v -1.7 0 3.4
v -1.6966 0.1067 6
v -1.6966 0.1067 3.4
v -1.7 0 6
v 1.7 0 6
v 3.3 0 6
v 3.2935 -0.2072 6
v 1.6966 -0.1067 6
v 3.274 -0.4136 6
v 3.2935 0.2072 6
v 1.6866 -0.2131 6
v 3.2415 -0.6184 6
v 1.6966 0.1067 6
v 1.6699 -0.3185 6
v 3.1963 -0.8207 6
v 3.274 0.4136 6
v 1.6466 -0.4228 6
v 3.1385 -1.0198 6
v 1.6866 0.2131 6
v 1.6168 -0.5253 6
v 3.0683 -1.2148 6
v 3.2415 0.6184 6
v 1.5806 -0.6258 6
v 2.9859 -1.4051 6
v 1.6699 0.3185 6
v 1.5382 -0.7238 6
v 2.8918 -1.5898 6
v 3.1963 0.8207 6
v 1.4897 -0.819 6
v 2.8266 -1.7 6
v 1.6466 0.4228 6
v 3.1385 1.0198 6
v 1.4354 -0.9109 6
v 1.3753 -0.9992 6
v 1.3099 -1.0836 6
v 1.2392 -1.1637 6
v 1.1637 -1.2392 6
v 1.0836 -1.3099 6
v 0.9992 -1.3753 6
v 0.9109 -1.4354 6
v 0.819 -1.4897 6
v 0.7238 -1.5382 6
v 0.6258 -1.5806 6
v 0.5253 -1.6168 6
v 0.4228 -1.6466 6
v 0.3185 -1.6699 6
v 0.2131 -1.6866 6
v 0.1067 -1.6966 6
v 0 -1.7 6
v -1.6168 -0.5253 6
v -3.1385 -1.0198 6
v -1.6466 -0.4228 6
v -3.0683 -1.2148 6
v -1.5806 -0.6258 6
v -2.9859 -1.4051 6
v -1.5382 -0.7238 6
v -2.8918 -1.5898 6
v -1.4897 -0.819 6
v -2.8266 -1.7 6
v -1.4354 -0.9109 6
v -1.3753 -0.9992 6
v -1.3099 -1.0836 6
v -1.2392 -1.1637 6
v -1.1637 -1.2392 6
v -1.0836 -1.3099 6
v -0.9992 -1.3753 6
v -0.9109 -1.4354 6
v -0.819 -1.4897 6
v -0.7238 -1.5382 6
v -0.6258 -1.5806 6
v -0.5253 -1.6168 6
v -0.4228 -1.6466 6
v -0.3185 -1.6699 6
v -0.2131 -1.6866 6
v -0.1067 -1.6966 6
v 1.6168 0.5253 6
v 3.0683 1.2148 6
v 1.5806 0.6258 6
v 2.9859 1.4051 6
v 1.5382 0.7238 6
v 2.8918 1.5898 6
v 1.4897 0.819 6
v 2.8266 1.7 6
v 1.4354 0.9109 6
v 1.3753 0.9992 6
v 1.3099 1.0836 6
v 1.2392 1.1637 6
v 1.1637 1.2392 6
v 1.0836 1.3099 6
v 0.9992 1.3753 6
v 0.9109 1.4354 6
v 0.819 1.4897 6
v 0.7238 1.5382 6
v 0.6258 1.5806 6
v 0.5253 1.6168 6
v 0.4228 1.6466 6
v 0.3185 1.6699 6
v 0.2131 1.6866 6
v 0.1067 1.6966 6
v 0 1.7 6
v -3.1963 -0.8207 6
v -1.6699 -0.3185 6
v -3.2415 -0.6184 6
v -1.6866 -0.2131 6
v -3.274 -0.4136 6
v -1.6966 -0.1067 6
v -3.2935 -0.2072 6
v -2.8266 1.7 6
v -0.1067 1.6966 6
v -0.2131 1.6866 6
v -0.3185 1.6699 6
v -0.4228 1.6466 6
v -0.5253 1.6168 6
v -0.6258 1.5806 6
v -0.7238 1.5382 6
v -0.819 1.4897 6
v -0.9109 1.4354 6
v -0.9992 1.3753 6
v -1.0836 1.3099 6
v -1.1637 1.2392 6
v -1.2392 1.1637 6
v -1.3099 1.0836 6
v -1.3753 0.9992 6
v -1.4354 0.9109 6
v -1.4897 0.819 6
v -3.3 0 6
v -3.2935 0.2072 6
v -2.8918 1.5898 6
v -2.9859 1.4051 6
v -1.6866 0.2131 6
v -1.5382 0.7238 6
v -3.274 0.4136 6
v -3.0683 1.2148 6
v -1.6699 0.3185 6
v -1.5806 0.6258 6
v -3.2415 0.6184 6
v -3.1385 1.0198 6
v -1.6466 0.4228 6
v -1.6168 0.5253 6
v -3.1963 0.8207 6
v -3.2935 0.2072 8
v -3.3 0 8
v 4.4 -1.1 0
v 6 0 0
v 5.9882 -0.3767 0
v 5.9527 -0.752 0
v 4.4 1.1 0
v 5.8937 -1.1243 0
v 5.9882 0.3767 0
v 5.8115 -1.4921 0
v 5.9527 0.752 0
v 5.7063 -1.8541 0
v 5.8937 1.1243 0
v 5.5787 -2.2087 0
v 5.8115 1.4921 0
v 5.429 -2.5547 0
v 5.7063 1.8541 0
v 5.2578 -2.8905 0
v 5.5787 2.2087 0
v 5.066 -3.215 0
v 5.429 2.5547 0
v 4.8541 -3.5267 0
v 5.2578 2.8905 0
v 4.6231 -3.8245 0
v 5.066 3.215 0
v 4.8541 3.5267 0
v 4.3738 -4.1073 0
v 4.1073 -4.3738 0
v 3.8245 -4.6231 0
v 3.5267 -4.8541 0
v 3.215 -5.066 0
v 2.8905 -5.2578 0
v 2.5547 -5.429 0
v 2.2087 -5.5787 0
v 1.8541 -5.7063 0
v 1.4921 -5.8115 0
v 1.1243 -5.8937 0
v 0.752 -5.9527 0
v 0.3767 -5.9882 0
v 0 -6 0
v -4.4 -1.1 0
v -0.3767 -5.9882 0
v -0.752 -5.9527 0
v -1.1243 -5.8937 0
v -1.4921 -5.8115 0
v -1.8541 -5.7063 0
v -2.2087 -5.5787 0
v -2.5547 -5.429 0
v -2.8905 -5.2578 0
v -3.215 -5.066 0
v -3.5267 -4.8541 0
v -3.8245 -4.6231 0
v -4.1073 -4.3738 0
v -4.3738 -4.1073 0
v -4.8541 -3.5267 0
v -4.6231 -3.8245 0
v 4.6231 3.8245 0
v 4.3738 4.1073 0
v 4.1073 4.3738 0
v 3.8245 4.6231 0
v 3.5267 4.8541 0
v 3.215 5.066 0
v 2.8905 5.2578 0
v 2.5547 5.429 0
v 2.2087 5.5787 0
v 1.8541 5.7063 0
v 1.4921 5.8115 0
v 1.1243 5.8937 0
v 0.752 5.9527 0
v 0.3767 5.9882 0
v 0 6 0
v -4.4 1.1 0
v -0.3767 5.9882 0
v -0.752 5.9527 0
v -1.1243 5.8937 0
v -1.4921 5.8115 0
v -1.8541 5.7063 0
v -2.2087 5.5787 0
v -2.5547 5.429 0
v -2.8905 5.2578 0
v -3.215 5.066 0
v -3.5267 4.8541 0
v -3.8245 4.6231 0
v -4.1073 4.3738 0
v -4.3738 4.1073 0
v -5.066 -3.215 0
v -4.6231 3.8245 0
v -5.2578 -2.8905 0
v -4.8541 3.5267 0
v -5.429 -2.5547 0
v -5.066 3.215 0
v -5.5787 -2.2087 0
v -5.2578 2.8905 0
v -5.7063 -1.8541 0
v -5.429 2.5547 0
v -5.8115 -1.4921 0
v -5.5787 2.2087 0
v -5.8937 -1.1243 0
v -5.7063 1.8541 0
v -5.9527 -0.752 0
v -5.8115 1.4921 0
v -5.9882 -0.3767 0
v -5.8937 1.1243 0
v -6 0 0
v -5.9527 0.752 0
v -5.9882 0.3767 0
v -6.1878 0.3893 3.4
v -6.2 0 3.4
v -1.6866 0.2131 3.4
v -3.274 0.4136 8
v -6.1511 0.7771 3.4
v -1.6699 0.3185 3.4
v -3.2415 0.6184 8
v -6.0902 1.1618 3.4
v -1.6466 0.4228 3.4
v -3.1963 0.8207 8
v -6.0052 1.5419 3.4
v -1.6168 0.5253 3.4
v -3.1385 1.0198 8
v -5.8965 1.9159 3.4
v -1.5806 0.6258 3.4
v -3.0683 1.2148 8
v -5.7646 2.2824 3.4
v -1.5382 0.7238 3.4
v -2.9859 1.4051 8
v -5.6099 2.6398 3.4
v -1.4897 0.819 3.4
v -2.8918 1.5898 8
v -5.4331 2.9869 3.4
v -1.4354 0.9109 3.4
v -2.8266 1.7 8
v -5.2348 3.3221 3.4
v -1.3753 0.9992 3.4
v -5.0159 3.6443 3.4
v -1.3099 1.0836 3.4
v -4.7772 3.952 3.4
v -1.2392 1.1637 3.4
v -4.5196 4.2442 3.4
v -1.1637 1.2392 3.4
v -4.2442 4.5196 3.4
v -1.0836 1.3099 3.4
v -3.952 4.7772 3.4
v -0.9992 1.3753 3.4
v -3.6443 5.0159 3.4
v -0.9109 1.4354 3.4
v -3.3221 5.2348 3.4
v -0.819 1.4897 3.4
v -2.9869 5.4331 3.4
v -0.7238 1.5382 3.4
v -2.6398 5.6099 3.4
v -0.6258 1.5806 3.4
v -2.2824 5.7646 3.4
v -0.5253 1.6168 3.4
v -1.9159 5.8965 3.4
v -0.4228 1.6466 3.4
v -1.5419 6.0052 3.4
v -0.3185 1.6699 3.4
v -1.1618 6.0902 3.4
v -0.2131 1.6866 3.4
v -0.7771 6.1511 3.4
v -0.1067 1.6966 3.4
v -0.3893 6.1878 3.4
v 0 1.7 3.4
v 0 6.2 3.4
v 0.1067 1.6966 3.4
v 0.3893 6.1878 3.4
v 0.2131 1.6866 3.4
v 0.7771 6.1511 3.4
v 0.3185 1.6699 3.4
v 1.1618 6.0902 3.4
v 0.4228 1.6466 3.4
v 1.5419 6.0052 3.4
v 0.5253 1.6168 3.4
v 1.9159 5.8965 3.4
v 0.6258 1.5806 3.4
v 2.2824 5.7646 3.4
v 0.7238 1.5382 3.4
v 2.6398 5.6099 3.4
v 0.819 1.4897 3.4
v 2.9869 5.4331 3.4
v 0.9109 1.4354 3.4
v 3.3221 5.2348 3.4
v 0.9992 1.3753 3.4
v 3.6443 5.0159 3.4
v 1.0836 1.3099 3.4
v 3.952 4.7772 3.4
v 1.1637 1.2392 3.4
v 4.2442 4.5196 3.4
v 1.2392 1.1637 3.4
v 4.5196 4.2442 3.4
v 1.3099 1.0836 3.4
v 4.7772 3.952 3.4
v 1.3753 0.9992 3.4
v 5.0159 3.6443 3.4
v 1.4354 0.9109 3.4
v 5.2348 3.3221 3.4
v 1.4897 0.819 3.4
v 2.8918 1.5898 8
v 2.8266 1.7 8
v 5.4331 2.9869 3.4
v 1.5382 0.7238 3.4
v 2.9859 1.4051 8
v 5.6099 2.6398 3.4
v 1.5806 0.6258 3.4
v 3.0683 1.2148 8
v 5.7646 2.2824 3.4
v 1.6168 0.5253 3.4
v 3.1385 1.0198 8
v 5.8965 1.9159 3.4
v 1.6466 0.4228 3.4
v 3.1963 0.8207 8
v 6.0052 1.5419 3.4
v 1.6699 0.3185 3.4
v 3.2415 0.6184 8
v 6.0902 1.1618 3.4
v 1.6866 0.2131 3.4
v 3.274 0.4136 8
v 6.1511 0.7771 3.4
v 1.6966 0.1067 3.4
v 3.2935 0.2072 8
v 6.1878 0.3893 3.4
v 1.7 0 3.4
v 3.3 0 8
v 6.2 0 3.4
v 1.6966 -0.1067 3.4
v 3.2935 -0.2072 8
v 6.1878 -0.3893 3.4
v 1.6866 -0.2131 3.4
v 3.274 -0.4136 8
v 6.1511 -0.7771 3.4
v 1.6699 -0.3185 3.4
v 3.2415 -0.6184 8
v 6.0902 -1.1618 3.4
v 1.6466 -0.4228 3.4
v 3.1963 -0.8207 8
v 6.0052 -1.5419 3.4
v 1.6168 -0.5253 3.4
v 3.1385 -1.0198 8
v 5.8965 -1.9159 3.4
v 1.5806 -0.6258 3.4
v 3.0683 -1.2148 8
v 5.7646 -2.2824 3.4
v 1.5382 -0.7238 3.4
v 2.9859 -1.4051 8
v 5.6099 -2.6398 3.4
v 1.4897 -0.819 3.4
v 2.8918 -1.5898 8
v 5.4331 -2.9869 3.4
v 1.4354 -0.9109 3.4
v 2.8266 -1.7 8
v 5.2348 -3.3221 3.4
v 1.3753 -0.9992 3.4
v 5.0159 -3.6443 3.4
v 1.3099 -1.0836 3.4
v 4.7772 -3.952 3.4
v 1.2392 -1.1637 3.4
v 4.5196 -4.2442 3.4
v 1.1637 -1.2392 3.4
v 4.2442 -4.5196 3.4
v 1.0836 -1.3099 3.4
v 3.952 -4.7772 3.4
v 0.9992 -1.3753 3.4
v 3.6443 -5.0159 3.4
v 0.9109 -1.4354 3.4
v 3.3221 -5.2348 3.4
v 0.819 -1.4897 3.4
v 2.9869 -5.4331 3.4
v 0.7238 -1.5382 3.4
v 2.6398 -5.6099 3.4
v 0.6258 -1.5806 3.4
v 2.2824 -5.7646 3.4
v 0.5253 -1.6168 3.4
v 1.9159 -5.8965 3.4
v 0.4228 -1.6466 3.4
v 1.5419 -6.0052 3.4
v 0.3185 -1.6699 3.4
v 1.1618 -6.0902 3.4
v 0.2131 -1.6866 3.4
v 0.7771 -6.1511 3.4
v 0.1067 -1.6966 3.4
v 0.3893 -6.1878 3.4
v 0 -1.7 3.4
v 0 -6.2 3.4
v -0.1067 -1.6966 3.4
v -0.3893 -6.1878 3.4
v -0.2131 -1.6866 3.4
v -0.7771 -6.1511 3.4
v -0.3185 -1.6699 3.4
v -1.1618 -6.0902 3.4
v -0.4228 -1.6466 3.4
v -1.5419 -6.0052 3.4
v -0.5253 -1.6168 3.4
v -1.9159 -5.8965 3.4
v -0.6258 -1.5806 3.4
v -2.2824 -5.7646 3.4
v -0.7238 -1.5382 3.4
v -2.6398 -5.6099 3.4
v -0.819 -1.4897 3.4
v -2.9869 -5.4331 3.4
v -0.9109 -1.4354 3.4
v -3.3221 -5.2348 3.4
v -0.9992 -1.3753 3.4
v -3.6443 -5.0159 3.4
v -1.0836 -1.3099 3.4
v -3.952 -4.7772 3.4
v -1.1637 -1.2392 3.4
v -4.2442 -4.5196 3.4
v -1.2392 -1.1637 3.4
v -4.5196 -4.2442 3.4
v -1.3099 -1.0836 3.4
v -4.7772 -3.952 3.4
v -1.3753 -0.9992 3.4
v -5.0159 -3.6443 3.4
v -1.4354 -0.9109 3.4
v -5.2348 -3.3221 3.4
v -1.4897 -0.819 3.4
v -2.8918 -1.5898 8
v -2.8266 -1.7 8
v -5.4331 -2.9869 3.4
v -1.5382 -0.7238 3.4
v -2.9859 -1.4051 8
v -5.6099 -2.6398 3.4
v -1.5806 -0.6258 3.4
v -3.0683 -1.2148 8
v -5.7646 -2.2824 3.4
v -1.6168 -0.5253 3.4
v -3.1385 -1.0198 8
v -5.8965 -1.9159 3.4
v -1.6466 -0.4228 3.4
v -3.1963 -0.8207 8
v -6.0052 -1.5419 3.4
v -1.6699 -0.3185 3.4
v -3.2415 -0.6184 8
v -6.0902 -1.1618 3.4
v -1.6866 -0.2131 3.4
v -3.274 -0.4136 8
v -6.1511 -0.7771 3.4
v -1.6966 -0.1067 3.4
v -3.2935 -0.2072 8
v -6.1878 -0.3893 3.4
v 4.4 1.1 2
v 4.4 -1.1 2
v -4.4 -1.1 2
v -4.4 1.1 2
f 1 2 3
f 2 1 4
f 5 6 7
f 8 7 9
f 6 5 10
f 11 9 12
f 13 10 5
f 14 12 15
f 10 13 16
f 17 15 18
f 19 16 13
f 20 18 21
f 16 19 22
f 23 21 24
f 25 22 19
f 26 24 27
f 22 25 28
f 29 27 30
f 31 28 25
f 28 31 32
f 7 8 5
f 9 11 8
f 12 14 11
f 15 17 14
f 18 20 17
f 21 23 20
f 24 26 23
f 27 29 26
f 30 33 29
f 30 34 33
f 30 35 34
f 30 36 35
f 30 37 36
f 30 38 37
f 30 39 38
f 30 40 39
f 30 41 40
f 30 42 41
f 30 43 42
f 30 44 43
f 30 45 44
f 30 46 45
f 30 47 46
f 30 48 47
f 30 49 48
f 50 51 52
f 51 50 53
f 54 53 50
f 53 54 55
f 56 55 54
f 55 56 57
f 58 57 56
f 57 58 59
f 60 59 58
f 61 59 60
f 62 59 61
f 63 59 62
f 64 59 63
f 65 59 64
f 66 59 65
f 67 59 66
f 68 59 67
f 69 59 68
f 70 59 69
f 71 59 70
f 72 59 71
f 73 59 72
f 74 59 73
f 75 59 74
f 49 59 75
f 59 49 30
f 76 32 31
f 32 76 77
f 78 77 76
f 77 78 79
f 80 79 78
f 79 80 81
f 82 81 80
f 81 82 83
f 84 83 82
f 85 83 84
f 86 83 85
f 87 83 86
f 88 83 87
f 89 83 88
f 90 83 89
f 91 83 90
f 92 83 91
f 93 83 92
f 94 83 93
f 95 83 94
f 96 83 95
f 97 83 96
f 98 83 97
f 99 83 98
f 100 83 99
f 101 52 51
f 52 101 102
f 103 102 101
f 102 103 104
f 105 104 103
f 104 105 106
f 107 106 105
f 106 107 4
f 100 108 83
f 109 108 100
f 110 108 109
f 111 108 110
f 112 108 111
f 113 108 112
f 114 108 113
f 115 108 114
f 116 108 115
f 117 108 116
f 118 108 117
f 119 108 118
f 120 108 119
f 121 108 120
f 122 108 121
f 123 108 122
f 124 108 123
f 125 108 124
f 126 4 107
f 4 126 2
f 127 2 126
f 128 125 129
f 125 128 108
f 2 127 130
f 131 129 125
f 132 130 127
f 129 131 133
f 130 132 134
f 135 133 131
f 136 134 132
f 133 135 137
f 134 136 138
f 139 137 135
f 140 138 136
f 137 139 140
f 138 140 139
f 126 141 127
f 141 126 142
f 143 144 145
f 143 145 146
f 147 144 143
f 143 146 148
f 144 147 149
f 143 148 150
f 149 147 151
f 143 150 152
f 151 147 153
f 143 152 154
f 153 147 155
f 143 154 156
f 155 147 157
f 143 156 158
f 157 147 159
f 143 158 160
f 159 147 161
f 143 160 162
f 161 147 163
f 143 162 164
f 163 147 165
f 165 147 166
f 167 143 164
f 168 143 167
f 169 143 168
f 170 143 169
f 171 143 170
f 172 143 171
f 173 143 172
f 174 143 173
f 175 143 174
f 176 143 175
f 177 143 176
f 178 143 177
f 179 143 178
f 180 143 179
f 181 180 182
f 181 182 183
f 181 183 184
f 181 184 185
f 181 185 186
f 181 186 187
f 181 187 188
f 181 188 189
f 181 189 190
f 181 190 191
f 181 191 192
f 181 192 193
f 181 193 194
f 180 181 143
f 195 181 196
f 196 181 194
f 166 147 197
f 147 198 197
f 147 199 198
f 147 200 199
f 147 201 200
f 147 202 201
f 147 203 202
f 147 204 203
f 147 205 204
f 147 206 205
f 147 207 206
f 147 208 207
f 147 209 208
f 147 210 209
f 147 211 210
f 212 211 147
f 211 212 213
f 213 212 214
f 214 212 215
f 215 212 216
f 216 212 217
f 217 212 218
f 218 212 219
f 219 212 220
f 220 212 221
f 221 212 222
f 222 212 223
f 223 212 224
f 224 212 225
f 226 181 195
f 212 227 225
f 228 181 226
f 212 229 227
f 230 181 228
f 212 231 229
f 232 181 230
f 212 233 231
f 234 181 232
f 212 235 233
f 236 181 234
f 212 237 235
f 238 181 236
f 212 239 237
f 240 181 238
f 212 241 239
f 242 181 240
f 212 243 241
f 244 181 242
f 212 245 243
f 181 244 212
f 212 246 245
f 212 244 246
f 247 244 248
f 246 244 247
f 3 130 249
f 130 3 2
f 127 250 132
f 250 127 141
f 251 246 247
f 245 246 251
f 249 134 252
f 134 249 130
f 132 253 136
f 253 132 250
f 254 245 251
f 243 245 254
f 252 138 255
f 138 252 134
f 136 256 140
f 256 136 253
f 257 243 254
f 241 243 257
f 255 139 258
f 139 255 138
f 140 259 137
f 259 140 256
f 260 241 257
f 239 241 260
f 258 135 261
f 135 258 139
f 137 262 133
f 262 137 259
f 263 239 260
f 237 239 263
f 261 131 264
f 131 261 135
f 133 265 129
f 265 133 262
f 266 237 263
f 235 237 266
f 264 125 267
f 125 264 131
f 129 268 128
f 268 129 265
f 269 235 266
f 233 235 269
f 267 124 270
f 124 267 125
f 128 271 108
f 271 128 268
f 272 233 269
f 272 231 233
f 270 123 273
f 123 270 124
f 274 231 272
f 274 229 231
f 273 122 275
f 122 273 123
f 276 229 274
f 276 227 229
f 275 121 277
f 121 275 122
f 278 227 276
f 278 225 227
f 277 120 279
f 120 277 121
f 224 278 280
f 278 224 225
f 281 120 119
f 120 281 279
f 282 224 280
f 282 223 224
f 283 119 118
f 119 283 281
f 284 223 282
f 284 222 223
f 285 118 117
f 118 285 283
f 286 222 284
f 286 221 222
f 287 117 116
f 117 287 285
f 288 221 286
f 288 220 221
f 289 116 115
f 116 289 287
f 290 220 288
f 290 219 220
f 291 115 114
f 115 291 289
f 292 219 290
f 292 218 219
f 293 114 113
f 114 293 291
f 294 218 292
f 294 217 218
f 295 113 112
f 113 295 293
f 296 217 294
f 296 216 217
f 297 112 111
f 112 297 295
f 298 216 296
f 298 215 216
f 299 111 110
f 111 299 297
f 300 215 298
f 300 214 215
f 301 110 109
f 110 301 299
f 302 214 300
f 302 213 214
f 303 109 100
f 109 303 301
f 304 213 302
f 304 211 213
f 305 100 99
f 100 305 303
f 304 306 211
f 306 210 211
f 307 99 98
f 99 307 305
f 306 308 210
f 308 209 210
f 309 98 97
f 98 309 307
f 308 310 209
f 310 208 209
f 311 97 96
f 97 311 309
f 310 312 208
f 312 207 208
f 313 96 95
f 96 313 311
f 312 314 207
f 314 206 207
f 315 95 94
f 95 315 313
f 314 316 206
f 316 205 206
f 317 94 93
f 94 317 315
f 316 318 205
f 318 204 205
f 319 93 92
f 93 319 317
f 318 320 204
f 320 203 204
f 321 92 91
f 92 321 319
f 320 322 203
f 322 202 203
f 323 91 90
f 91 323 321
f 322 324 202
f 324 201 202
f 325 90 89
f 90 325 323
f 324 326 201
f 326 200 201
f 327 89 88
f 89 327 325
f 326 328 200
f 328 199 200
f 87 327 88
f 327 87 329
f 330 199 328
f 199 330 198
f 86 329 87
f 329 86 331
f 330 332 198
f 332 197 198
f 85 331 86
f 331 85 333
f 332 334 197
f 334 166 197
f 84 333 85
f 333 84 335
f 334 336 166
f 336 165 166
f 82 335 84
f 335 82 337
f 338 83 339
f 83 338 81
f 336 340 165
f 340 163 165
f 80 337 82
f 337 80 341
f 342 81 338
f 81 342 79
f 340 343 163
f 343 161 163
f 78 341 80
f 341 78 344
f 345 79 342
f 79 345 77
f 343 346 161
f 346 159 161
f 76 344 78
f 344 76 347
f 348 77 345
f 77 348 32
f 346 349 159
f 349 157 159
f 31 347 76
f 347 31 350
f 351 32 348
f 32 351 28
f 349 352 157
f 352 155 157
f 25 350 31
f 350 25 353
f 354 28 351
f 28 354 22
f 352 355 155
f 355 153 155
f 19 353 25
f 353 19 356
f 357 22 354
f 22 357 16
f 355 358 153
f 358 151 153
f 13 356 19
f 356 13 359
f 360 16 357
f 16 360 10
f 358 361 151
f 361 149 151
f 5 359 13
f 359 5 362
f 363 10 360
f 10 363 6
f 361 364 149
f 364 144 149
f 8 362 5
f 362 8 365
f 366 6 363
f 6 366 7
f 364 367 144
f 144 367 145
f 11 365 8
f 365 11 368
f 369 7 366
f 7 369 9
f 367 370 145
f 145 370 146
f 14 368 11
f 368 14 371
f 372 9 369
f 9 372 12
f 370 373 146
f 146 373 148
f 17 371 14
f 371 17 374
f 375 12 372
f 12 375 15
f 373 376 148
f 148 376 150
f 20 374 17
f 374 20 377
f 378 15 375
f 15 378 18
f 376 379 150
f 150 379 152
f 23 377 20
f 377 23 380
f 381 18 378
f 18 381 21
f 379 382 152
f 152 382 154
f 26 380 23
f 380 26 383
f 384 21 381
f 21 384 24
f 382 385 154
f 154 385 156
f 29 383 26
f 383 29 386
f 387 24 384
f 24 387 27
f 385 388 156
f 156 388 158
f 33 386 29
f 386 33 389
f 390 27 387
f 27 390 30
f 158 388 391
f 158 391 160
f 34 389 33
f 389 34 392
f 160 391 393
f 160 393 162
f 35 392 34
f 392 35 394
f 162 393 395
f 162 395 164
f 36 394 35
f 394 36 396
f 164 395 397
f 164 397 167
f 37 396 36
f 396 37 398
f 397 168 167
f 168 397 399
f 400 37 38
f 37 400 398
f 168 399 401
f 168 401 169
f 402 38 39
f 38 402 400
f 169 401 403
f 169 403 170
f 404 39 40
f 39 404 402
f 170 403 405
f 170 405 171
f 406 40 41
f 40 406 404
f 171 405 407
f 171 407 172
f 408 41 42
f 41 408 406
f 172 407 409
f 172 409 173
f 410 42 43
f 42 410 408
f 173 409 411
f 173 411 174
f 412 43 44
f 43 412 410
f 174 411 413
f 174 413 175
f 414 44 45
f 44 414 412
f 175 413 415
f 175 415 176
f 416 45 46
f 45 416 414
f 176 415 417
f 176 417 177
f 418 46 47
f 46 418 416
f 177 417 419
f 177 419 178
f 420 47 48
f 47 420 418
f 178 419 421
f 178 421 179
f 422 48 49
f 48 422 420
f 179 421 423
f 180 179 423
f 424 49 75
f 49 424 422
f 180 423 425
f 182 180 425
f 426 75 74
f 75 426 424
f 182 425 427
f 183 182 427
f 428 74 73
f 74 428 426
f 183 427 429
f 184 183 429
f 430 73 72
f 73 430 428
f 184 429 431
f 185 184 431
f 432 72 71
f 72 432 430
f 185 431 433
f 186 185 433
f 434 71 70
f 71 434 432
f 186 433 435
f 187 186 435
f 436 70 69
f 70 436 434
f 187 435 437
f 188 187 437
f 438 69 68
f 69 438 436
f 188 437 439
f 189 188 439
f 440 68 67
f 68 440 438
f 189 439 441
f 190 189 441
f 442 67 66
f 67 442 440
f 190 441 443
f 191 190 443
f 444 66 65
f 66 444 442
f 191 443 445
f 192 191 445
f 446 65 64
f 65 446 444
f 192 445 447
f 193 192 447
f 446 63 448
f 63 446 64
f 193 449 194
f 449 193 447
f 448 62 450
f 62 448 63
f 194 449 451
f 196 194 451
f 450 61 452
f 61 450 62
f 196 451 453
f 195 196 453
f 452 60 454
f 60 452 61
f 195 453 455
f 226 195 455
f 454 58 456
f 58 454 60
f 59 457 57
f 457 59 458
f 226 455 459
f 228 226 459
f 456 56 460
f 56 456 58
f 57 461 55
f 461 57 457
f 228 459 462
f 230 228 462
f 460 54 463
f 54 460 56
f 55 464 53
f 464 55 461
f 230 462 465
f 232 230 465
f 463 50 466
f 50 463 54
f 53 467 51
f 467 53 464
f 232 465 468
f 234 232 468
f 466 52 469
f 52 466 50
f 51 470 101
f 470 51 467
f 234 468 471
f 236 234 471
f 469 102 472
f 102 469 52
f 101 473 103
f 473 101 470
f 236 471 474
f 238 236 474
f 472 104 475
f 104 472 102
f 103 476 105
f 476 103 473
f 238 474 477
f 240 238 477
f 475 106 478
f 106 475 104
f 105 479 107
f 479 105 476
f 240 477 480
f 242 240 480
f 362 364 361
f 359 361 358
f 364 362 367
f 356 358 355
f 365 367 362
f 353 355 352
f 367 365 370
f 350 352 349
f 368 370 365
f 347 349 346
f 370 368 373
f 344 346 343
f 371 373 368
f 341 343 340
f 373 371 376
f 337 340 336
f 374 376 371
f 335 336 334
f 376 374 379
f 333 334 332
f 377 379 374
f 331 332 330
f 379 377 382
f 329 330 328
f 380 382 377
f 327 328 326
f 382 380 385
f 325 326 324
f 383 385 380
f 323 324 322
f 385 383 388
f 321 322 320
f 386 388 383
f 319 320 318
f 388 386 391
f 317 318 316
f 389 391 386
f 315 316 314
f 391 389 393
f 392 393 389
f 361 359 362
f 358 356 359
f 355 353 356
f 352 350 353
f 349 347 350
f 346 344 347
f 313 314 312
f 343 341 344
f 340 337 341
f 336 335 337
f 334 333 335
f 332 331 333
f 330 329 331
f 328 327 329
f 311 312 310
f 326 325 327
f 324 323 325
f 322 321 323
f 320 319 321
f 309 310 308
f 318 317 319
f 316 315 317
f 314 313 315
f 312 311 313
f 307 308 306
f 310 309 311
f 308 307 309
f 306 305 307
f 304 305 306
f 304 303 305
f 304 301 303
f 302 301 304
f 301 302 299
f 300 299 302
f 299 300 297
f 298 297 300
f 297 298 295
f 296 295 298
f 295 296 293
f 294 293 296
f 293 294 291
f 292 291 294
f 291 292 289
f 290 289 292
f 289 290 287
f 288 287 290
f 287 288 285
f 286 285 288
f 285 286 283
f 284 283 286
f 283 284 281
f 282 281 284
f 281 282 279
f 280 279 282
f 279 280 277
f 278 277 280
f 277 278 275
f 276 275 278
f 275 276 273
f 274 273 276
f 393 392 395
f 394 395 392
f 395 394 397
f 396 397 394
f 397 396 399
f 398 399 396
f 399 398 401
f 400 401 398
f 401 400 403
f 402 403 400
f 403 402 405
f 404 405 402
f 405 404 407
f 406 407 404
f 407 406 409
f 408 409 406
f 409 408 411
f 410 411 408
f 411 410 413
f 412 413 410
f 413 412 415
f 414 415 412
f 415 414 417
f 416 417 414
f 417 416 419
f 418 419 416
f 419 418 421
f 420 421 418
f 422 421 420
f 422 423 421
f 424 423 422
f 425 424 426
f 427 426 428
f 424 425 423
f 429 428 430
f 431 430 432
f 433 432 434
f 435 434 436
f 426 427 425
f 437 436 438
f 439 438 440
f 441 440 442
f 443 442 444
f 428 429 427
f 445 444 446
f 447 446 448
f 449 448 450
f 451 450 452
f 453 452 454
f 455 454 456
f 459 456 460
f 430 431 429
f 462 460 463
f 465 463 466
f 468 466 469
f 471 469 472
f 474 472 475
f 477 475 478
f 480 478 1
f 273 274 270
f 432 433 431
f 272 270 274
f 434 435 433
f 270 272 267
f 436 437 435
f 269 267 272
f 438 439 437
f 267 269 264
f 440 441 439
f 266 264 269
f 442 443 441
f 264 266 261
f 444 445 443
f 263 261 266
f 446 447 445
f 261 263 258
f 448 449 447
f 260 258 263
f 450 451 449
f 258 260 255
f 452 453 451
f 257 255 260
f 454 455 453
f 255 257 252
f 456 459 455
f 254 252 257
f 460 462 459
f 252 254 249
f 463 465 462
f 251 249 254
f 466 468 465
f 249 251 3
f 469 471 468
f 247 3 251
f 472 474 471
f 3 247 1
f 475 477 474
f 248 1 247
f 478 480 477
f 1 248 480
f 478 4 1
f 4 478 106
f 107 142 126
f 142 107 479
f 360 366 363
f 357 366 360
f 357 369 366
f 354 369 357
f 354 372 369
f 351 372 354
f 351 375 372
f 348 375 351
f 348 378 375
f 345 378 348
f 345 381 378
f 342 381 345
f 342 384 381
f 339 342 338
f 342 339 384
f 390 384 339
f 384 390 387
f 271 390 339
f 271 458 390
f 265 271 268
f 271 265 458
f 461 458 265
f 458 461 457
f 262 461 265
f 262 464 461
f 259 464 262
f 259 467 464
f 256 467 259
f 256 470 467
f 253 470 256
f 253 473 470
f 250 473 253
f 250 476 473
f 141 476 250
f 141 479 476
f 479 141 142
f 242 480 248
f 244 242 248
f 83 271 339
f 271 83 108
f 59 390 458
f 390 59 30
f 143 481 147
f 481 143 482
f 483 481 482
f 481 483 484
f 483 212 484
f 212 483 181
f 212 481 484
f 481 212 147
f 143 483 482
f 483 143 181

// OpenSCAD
difference(){
  rotate_extrude(angle = 360, $fn=100)
    polygon(points=[ [0,0], [6,0], [6.2,3.4], [1.7,3.4], [1.7,6], [3.3,6], [3.3,8], [0,8]]      );

  translate([-6,1.7,6])
    cube(size = [12, 2, 2]);  
  translate([-6,-3.7,6])
    cube(size = [12, 2, 2]);  
  
  translate([-4.4,-1.1,0])
    cube(size = [8.8,2.2,2]);  
}

    
